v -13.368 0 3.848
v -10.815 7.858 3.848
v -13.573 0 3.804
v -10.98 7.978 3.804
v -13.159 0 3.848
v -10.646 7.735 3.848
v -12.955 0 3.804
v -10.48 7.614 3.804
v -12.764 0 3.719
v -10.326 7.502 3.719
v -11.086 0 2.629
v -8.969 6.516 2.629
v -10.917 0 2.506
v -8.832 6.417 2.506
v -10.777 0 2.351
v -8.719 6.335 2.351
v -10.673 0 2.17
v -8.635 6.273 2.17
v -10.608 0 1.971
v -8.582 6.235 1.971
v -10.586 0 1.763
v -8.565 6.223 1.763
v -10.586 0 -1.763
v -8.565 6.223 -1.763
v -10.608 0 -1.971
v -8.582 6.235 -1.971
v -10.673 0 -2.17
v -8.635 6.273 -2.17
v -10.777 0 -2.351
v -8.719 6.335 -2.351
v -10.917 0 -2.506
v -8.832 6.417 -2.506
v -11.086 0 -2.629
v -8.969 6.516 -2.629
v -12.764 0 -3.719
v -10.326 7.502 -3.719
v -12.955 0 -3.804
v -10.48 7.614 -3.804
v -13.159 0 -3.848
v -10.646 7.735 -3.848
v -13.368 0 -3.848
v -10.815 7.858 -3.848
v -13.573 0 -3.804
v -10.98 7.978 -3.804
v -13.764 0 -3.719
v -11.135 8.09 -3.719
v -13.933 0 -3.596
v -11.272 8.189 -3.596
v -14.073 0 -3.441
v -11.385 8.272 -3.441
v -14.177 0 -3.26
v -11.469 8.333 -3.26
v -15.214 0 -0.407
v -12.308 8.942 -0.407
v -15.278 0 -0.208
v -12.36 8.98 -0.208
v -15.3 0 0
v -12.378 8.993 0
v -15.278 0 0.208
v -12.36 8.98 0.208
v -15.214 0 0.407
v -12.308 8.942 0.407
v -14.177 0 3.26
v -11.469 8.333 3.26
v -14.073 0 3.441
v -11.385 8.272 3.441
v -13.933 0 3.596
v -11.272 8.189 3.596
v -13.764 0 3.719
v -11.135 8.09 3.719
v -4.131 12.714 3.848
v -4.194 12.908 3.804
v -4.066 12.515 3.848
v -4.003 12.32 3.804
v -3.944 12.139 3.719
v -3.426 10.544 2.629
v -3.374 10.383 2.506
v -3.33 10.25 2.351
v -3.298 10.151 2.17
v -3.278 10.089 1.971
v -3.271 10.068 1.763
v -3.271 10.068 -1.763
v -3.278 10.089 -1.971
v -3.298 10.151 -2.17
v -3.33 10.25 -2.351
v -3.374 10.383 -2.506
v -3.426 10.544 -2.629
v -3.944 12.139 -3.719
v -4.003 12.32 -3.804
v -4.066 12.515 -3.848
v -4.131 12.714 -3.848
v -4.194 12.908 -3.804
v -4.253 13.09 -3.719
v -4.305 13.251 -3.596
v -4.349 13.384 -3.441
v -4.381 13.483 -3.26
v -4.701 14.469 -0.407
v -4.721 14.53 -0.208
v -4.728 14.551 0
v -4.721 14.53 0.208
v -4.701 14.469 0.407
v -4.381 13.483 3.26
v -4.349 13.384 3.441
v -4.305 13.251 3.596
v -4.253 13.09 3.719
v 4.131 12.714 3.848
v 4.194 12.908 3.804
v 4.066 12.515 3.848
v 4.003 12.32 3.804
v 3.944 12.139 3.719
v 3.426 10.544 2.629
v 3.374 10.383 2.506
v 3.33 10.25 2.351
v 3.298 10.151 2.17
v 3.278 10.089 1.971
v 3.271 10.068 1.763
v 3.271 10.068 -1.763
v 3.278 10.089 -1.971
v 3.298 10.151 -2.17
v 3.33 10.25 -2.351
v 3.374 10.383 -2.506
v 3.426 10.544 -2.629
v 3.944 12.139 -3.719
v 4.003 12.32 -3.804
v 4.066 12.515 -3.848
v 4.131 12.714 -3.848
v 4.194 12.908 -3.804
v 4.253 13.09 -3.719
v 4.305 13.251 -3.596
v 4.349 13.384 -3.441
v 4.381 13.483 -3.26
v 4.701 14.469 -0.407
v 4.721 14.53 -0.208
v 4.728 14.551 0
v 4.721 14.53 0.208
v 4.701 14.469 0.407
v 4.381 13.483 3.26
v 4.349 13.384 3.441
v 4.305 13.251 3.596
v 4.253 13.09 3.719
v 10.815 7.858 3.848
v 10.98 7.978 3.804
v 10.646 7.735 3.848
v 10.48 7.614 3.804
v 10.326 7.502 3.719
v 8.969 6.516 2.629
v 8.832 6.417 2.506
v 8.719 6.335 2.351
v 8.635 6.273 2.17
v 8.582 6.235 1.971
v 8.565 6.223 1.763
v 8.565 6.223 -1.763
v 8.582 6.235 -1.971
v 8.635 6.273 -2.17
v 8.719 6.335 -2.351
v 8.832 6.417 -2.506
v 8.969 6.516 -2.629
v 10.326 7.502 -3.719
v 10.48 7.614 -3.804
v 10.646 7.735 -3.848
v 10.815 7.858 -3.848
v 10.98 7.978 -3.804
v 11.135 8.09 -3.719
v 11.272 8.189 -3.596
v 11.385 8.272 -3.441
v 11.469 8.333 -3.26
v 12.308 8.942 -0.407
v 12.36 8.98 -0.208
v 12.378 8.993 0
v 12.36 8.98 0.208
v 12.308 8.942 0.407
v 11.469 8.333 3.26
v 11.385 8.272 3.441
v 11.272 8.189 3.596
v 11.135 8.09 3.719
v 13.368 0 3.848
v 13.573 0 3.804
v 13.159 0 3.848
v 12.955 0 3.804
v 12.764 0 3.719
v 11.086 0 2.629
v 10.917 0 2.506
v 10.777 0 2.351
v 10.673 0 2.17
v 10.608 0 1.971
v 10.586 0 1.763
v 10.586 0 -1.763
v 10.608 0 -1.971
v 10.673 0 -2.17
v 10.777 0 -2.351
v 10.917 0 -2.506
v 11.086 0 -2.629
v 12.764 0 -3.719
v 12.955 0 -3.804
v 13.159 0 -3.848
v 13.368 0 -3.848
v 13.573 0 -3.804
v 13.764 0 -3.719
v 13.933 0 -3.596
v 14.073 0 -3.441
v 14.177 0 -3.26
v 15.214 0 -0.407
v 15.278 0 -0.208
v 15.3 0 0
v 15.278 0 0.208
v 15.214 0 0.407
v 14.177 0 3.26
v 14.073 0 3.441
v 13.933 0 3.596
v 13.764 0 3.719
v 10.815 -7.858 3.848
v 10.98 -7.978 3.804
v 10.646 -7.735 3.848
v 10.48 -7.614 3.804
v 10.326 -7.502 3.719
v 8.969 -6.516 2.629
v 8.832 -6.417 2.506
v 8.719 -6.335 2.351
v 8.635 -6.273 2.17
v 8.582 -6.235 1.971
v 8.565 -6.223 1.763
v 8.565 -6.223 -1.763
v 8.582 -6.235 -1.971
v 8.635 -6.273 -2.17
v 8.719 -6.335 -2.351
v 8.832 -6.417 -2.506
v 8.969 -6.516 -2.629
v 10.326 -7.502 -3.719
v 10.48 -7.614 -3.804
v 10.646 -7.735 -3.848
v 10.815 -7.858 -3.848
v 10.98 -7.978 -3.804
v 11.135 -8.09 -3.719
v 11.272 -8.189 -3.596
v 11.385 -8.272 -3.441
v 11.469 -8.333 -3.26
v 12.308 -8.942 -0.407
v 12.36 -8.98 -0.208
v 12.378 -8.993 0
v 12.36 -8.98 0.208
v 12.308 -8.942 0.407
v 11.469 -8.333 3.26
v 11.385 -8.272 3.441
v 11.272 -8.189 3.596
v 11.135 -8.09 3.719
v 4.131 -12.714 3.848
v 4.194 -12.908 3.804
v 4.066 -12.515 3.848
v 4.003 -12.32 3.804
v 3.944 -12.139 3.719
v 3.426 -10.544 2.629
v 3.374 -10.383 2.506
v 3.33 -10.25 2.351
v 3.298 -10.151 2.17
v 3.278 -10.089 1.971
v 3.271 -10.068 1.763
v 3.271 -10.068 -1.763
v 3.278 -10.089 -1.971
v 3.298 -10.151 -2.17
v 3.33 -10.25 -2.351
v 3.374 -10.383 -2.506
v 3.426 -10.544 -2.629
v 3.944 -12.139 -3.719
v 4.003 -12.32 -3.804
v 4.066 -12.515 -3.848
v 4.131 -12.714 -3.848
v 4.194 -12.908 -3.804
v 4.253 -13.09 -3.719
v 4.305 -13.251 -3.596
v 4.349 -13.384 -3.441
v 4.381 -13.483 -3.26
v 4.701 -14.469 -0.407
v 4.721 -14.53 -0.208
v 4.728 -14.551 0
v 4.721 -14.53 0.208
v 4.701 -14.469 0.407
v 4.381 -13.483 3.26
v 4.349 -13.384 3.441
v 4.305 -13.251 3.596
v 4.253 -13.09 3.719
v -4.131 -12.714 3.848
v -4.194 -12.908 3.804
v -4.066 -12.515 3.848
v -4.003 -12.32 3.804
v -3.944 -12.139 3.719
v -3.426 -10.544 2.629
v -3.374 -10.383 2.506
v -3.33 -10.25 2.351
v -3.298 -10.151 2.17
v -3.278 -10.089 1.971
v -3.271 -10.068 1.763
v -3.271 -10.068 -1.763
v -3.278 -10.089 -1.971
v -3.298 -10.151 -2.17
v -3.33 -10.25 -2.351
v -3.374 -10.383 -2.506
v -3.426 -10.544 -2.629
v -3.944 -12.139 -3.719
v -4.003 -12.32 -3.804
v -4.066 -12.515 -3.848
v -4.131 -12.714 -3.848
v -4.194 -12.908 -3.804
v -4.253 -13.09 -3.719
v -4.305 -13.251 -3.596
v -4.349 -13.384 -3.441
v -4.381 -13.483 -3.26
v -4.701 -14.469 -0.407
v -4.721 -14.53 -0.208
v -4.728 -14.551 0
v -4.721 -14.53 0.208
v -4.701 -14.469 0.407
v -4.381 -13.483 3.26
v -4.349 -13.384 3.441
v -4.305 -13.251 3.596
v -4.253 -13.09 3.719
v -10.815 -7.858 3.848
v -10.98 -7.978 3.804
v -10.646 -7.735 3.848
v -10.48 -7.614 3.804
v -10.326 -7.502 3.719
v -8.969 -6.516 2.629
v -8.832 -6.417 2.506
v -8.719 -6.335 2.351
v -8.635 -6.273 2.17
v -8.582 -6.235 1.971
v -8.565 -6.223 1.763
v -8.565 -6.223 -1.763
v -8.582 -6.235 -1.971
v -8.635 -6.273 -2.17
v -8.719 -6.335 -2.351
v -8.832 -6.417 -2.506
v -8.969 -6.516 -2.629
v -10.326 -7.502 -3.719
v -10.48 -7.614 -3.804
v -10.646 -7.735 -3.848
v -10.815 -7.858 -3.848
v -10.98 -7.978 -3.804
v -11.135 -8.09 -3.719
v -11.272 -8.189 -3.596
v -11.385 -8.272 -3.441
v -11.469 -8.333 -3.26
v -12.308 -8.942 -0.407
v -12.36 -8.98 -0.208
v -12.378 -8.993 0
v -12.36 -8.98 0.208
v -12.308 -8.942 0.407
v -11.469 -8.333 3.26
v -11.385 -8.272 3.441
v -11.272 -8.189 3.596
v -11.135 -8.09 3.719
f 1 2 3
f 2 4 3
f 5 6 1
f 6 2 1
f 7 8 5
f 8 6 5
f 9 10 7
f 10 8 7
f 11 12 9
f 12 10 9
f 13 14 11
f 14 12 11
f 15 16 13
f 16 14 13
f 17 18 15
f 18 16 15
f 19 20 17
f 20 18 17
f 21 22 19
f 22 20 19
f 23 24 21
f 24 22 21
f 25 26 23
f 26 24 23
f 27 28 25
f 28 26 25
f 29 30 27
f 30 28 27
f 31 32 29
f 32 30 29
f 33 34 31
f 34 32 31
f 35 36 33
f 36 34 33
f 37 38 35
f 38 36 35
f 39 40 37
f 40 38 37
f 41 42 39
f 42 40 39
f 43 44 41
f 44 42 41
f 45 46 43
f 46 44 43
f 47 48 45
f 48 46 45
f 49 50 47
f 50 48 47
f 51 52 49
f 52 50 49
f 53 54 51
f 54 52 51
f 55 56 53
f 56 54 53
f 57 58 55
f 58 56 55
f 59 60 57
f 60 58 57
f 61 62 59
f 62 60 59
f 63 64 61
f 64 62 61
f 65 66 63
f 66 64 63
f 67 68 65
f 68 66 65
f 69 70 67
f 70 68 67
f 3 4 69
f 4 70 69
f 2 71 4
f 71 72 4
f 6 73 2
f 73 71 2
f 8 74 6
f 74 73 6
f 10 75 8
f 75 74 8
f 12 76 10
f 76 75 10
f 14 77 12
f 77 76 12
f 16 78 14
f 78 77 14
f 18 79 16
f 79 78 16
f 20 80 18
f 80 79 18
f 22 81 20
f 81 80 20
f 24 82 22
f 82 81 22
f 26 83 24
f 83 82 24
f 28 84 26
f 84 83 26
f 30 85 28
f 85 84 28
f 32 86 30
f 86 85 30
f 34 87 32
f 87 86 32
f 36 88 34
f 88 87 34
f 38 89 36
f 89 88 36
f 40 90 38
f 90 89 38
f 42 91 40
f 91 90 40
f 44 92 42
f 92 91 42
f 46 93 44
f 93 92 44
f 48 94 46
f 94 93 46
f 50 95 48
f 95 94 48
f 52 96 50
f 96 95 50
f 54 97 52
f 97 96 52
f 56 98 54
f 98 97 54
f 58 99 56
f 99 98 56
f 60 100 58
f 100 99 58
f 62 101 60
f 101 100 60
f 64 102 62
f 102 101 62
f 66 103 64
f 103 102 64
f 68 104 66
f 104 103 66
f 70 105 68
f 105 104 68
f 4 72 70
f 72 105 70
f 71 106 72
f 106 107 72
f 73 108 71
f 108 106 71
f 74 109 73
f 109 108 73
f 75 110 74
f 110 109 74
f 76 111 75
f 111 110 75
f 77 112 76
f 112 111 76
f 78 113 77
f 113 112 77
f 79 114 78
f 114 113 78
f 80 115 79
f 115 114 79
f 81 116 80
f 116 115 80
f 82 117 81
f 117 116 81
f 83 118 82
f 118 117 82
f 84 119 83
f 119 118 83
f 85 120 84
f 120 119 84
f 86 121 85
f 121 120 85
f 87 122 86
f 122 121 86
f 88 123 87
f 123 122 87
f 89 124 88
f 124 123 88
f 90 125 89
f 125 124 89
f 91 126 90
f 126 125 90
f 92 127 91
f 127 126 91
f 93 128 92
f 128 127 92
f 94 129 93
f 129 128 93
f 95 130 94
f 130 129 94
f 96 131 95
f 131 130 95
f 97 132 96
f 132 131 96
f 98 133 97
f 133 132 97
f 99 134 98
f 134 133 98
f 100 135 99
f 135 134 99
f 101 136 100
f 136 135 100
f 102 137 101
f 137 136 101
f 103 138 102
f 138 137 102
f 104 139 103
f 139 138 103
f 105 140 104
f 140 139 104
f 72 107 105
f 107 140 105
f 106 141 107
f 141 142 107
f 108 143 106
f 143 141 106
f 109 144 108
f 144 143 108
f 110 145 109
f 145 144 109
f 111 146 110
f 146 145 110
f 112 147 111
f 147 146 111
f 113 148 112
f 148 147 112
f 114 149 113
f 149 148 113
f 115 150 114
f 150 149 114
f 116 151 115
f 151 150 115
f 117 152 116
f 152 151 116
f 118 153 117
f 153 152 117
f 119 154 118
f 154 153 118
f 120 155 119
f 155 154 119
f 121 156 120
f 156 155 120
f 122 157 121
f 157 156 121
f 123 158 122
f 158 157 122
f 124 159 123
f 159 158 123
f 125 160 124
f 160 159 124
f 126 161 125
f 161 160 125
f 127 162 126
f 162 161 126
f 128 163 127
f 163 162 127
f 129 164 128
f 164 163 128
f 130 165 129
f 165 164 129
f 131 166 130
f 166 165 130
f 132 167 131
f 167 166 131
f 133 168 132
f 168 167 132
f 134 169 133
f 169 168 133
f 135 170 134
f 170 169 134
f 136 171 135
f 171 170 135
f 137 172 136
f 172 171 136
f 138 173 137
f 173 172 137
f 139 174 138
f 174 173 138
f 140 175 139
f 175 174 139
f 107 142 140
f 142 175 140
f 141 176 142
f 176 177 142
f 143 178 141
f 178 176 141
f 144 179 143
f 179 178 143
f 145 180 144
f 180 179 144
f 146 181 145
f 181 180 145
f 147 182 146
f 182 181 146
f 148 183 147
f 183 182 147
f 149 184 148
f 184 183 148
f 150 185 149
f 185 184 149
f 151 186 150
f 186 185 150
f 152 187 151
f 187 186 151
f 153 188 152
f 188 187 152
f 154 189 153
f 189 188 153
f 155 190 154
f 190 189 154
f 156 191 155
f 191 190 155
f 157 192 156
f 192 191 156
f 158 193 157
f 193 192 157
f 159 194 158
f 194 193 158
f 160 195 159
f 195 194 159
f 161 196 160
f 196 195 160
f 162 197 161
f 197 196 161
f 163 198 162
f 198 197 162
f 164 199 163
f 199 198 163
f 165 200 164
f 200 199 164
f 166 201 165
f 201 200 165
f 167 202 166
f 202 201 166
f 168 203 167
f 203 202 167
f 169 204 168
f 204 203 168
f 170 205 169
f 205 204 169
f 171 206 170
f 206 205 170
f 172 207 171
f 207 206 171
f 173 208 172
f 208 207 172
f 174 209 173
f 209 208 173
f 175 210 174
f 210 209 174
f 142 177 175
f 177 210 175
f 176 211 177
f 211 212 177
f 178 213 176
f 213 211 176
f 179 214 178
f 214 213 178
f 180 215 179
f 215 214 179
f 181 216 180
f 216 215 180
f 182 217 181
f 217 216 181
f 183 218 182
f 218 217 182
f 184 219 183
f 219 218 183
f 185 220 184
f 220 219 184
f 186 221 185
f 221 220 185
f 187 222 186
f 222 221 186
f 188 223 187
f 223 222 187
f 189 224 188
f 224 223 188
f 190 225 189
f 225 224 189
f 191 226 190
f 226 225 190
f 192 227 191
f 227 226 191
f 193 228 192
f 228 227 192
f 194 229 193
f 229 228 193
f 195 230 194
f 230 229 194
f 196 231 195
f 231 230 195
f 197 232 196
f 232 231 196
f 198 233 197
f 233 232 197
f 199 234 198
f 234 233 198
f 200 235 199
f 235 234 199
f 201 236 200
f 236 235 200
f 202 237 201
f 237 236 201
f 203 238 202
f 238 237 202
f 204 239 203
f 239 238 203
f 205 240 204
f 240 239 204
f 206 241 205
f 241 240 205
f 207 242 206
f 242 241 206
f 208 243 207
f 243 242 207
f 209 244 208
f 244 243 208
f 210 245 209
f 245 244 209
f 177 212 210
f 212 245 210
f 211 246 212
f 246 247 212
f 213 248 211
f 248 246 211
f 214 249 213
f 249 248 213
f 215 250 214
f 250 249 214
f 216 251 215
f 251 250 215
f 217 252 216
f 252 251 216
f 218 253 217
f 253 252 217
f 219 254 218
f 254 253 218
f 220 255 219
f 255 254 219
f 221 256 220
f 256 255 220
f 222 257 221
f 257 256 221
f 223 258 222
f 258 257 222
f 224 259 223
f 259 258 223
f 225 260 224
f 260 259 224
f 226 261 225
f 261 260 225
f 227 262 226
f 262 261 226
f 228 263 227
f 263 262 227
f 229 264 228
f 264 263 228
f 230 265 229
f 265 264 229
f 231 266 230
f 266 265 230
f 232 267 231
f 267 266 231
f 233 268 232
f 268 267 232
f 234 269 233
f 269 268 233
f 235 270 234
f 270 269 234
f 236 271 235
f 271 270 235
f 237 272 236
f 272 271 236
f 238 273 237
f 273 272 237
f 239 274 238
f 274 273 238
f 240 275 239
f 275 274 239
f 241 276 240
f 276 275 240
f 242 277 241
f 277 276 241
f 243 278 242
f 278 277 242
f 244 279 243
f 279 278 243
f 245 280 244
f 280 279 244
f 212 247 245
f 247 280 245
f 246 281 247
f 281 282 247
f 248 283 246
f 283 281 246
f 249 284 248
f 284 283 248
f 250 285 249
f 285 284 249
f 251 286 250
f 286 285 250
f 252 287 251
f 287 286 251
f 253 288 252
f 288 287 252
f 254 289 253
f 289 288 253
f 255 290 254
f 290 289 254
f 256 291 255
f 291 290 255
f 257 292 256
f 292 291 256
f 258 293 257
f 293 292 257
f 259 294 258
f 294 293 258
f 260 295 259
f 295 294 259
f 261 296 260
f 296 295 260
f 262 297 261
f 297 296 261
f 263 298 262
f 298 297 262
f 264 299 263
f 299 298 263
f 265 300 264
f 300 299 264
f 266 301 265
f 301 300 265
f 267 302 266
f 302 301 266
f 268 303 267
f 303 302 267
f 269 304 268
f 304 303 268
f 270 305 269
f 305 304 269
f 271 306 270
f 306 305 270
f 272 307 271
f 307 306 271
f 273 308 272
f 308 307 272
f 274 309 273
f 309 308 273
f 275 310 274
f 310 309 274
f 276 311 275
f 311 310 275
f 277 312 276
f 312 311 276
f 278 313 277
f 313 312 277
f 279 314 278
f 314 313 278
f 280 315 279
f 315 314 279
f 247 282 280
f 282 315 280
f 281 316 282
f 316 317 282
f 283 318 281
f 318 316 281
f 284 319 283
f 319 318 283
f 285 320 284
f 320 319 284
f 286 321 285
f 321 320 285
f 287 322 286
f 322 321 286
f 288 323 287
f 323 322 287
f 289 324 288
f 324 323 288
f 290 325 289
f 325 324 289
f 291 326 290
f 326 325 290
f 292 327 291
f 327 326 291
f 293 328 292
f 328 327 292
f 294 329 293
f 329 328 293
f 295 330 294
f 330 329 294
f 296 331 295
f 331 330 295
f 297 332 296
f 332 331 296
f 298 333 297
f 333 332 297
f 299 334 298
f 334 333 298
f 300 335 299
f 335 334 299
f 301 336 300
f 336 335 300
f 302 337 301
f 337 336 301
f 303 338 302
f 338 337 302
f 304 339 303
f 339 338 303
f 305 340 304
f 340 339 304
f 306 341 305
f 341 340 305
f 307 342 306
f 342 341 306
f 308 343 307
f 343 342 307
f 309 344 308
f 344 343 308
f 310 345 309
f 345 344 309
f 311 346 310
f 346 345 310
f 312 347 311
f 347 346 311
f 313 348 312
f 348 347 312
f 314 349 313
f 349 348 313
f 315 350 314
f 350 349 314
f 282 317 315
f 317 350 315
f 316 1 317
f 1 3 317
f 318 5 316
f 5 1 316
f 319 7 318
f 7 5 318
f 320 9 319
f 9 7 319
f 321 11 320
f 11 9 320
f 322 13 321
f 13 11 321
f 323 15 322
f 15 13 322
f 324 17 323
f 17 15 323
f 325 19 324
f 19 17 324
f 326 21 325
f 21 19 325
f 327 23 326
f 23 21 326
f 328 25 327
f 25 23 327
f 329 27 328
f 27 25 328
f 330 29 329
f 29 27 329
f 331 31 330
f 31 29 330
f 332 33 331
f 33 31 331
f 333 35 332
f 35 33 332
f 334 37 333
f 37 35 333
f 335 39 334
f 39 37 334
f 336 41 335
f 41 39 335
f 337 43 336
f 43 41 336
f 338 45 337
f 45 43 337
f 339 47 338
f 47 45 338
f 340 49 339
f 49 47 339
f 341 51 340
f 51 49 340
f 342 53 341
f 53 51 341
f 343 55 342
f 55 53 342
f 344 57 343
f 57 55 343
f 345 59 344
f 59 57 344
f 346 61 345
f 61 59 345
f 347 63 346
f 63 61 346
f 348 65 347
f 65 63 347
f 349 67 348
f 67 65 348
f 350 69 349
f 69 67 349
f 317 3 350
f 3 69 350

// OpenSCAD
fn1 = 5; // [5, 60]
fn2 = 10; // [24, 60]
ro_fn = 30;

r1 = 21.4;

round_over = 1 ; 
// round_over = 0.0001 ; 

a1 = 360/fn1;
a2 = 360/fn2;

outscribed_ratio = 1 - cos( a1 / 2 ) ;
inscribed_ratio  = cos( a2 / 2 ) ;

target = 90  ; 

id = (  target  - ( r1 * outscribed_ratio) )/ inscribed_ratio + round_over / 2;
// id =  (target  - ( r1 * outscribed_ratio ))/inscribed_ratio ;


// cylinder(1 , target/2, target/2, $fn= 100);

function move_it(scalar) = scalar * [1, 0, 0];


ratio = 2.11; 




// rotate([90])
// rotate(90)
// rotate([90])
// rotate(90)
// {
    
// rotate([ 0, 90 , 0 ])
// rotate(90)
// sphere(7+1.1, $fn = 10);

// rotate(90)
// sonic_ring( r1, ratio, 14.8 );
// }

// rotate([90])
// rotate(90)
// {
    
// rotate([ 0, 90 , 0 ])
// rotate(0)
// sonic_ring( r1, ratio, 32.1 );

// rotate(90)
// sonic_ring( r1, ratio, 48.5 );
// }

// rotate([ 0, 90 , 0 ])
// sonic_ring( r1, ratio, 64 );

// rotate(90)
// sonic_ring( r1, ratio, 78.8 );


sonic_ring( 10, 2, 20.6 );




// translate( move_it( 1.6 * id ) )
// sonic_ring(r1, 2, id );

// translate( move_it( 3.2 * id ) )
// sonic_ring( 2 * r1, 2, id );

// translate( move_it( 5.4 * id ) )
// sonic_ring( 2 * r1, 1, id );

// translate( move_it( 5.4 * id ) )
// sonic_ring( 2 * r1, 1, id );

// translate( move_it( 7.8 * id ) )
// sonic_ring( 2 * r1, 2, id* 1.5);

// translate( move_it( 10.4 * id ) )
// sonic_ring( 2 * r1, 1, id* 1.5);



module sonic_ring( height, hr, inner_diameter ){
    r1 = height / 2 / hr;
    r2 = inner_diameter / 2;

    
    rotate_extrude( $fn = fn2 )
    minkowski() {
        circle(round_over , $fn = ro_fn);
        scale([ 1, height/r1/2 ])
            translate([r1 + r2 ,0 ,0 ])
            rotate(180 + a1/2 )
            circle(r1 - round_over , $fn = fn1);
    }
}
